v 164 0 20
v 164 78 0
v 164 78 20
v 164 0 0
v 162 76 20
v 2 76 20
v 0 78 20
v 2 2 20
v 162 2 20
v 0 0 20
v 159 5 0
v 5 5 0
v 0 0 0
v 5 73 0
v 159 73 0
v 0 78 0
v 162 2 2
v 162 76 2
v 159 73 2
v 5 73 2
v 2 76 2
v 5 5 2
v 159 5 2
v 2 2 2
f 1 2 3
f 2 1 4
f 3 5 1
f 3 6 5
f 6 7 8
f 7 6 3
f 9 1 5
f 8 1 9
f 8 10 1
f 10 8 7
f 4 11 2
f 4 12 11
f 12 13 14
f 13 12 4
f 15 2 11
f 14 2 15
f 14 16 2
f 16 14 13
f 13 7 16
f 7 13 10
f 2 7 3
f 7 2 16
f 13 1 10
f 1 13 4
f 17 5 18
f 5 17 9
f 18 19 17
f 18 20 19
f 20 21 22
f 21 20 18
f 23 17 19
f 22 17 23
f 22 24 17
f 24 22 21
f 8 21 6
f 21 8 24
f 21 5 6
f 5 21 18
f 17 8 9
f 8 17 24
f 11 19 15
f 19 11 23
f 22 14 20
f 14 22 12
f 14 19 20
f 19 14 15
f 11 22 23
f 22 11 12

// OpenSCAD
// Box enclosure for 160x74x18mm object

// Inner dimensions (the object to enclose)
inner_length = 160;
inner_width = 74;
inner_height = 18;

// Wall thickness
wall = 2;

// Bottom hole inset from inner walls
hole_inset = 3;

// Outer dimensions
outer_length = inner_length + 2 * wall;
outer_width = inner_width + 2 * wall;
outer_height = inner_height + wall; // wall on bottom only, open top

// Bottom hole dimensions
hole_length = inner_length - 2 * hole_inset;
hole_width = inner_width - 2 * hole_inset;

difference() {
    // Outer shell
    cube([outer_length, outer_width, outer_height]);

    // Inner cavity
    translate([wall, wall, wall])
        cube([inner_length, inner_width, inner_height + 1]);

    // Square hole in the bottom
    translate([wall + hole_inset, wall + hole_inset, -1])
        cube([hole_length, hole_width, wall + 2]);
}
